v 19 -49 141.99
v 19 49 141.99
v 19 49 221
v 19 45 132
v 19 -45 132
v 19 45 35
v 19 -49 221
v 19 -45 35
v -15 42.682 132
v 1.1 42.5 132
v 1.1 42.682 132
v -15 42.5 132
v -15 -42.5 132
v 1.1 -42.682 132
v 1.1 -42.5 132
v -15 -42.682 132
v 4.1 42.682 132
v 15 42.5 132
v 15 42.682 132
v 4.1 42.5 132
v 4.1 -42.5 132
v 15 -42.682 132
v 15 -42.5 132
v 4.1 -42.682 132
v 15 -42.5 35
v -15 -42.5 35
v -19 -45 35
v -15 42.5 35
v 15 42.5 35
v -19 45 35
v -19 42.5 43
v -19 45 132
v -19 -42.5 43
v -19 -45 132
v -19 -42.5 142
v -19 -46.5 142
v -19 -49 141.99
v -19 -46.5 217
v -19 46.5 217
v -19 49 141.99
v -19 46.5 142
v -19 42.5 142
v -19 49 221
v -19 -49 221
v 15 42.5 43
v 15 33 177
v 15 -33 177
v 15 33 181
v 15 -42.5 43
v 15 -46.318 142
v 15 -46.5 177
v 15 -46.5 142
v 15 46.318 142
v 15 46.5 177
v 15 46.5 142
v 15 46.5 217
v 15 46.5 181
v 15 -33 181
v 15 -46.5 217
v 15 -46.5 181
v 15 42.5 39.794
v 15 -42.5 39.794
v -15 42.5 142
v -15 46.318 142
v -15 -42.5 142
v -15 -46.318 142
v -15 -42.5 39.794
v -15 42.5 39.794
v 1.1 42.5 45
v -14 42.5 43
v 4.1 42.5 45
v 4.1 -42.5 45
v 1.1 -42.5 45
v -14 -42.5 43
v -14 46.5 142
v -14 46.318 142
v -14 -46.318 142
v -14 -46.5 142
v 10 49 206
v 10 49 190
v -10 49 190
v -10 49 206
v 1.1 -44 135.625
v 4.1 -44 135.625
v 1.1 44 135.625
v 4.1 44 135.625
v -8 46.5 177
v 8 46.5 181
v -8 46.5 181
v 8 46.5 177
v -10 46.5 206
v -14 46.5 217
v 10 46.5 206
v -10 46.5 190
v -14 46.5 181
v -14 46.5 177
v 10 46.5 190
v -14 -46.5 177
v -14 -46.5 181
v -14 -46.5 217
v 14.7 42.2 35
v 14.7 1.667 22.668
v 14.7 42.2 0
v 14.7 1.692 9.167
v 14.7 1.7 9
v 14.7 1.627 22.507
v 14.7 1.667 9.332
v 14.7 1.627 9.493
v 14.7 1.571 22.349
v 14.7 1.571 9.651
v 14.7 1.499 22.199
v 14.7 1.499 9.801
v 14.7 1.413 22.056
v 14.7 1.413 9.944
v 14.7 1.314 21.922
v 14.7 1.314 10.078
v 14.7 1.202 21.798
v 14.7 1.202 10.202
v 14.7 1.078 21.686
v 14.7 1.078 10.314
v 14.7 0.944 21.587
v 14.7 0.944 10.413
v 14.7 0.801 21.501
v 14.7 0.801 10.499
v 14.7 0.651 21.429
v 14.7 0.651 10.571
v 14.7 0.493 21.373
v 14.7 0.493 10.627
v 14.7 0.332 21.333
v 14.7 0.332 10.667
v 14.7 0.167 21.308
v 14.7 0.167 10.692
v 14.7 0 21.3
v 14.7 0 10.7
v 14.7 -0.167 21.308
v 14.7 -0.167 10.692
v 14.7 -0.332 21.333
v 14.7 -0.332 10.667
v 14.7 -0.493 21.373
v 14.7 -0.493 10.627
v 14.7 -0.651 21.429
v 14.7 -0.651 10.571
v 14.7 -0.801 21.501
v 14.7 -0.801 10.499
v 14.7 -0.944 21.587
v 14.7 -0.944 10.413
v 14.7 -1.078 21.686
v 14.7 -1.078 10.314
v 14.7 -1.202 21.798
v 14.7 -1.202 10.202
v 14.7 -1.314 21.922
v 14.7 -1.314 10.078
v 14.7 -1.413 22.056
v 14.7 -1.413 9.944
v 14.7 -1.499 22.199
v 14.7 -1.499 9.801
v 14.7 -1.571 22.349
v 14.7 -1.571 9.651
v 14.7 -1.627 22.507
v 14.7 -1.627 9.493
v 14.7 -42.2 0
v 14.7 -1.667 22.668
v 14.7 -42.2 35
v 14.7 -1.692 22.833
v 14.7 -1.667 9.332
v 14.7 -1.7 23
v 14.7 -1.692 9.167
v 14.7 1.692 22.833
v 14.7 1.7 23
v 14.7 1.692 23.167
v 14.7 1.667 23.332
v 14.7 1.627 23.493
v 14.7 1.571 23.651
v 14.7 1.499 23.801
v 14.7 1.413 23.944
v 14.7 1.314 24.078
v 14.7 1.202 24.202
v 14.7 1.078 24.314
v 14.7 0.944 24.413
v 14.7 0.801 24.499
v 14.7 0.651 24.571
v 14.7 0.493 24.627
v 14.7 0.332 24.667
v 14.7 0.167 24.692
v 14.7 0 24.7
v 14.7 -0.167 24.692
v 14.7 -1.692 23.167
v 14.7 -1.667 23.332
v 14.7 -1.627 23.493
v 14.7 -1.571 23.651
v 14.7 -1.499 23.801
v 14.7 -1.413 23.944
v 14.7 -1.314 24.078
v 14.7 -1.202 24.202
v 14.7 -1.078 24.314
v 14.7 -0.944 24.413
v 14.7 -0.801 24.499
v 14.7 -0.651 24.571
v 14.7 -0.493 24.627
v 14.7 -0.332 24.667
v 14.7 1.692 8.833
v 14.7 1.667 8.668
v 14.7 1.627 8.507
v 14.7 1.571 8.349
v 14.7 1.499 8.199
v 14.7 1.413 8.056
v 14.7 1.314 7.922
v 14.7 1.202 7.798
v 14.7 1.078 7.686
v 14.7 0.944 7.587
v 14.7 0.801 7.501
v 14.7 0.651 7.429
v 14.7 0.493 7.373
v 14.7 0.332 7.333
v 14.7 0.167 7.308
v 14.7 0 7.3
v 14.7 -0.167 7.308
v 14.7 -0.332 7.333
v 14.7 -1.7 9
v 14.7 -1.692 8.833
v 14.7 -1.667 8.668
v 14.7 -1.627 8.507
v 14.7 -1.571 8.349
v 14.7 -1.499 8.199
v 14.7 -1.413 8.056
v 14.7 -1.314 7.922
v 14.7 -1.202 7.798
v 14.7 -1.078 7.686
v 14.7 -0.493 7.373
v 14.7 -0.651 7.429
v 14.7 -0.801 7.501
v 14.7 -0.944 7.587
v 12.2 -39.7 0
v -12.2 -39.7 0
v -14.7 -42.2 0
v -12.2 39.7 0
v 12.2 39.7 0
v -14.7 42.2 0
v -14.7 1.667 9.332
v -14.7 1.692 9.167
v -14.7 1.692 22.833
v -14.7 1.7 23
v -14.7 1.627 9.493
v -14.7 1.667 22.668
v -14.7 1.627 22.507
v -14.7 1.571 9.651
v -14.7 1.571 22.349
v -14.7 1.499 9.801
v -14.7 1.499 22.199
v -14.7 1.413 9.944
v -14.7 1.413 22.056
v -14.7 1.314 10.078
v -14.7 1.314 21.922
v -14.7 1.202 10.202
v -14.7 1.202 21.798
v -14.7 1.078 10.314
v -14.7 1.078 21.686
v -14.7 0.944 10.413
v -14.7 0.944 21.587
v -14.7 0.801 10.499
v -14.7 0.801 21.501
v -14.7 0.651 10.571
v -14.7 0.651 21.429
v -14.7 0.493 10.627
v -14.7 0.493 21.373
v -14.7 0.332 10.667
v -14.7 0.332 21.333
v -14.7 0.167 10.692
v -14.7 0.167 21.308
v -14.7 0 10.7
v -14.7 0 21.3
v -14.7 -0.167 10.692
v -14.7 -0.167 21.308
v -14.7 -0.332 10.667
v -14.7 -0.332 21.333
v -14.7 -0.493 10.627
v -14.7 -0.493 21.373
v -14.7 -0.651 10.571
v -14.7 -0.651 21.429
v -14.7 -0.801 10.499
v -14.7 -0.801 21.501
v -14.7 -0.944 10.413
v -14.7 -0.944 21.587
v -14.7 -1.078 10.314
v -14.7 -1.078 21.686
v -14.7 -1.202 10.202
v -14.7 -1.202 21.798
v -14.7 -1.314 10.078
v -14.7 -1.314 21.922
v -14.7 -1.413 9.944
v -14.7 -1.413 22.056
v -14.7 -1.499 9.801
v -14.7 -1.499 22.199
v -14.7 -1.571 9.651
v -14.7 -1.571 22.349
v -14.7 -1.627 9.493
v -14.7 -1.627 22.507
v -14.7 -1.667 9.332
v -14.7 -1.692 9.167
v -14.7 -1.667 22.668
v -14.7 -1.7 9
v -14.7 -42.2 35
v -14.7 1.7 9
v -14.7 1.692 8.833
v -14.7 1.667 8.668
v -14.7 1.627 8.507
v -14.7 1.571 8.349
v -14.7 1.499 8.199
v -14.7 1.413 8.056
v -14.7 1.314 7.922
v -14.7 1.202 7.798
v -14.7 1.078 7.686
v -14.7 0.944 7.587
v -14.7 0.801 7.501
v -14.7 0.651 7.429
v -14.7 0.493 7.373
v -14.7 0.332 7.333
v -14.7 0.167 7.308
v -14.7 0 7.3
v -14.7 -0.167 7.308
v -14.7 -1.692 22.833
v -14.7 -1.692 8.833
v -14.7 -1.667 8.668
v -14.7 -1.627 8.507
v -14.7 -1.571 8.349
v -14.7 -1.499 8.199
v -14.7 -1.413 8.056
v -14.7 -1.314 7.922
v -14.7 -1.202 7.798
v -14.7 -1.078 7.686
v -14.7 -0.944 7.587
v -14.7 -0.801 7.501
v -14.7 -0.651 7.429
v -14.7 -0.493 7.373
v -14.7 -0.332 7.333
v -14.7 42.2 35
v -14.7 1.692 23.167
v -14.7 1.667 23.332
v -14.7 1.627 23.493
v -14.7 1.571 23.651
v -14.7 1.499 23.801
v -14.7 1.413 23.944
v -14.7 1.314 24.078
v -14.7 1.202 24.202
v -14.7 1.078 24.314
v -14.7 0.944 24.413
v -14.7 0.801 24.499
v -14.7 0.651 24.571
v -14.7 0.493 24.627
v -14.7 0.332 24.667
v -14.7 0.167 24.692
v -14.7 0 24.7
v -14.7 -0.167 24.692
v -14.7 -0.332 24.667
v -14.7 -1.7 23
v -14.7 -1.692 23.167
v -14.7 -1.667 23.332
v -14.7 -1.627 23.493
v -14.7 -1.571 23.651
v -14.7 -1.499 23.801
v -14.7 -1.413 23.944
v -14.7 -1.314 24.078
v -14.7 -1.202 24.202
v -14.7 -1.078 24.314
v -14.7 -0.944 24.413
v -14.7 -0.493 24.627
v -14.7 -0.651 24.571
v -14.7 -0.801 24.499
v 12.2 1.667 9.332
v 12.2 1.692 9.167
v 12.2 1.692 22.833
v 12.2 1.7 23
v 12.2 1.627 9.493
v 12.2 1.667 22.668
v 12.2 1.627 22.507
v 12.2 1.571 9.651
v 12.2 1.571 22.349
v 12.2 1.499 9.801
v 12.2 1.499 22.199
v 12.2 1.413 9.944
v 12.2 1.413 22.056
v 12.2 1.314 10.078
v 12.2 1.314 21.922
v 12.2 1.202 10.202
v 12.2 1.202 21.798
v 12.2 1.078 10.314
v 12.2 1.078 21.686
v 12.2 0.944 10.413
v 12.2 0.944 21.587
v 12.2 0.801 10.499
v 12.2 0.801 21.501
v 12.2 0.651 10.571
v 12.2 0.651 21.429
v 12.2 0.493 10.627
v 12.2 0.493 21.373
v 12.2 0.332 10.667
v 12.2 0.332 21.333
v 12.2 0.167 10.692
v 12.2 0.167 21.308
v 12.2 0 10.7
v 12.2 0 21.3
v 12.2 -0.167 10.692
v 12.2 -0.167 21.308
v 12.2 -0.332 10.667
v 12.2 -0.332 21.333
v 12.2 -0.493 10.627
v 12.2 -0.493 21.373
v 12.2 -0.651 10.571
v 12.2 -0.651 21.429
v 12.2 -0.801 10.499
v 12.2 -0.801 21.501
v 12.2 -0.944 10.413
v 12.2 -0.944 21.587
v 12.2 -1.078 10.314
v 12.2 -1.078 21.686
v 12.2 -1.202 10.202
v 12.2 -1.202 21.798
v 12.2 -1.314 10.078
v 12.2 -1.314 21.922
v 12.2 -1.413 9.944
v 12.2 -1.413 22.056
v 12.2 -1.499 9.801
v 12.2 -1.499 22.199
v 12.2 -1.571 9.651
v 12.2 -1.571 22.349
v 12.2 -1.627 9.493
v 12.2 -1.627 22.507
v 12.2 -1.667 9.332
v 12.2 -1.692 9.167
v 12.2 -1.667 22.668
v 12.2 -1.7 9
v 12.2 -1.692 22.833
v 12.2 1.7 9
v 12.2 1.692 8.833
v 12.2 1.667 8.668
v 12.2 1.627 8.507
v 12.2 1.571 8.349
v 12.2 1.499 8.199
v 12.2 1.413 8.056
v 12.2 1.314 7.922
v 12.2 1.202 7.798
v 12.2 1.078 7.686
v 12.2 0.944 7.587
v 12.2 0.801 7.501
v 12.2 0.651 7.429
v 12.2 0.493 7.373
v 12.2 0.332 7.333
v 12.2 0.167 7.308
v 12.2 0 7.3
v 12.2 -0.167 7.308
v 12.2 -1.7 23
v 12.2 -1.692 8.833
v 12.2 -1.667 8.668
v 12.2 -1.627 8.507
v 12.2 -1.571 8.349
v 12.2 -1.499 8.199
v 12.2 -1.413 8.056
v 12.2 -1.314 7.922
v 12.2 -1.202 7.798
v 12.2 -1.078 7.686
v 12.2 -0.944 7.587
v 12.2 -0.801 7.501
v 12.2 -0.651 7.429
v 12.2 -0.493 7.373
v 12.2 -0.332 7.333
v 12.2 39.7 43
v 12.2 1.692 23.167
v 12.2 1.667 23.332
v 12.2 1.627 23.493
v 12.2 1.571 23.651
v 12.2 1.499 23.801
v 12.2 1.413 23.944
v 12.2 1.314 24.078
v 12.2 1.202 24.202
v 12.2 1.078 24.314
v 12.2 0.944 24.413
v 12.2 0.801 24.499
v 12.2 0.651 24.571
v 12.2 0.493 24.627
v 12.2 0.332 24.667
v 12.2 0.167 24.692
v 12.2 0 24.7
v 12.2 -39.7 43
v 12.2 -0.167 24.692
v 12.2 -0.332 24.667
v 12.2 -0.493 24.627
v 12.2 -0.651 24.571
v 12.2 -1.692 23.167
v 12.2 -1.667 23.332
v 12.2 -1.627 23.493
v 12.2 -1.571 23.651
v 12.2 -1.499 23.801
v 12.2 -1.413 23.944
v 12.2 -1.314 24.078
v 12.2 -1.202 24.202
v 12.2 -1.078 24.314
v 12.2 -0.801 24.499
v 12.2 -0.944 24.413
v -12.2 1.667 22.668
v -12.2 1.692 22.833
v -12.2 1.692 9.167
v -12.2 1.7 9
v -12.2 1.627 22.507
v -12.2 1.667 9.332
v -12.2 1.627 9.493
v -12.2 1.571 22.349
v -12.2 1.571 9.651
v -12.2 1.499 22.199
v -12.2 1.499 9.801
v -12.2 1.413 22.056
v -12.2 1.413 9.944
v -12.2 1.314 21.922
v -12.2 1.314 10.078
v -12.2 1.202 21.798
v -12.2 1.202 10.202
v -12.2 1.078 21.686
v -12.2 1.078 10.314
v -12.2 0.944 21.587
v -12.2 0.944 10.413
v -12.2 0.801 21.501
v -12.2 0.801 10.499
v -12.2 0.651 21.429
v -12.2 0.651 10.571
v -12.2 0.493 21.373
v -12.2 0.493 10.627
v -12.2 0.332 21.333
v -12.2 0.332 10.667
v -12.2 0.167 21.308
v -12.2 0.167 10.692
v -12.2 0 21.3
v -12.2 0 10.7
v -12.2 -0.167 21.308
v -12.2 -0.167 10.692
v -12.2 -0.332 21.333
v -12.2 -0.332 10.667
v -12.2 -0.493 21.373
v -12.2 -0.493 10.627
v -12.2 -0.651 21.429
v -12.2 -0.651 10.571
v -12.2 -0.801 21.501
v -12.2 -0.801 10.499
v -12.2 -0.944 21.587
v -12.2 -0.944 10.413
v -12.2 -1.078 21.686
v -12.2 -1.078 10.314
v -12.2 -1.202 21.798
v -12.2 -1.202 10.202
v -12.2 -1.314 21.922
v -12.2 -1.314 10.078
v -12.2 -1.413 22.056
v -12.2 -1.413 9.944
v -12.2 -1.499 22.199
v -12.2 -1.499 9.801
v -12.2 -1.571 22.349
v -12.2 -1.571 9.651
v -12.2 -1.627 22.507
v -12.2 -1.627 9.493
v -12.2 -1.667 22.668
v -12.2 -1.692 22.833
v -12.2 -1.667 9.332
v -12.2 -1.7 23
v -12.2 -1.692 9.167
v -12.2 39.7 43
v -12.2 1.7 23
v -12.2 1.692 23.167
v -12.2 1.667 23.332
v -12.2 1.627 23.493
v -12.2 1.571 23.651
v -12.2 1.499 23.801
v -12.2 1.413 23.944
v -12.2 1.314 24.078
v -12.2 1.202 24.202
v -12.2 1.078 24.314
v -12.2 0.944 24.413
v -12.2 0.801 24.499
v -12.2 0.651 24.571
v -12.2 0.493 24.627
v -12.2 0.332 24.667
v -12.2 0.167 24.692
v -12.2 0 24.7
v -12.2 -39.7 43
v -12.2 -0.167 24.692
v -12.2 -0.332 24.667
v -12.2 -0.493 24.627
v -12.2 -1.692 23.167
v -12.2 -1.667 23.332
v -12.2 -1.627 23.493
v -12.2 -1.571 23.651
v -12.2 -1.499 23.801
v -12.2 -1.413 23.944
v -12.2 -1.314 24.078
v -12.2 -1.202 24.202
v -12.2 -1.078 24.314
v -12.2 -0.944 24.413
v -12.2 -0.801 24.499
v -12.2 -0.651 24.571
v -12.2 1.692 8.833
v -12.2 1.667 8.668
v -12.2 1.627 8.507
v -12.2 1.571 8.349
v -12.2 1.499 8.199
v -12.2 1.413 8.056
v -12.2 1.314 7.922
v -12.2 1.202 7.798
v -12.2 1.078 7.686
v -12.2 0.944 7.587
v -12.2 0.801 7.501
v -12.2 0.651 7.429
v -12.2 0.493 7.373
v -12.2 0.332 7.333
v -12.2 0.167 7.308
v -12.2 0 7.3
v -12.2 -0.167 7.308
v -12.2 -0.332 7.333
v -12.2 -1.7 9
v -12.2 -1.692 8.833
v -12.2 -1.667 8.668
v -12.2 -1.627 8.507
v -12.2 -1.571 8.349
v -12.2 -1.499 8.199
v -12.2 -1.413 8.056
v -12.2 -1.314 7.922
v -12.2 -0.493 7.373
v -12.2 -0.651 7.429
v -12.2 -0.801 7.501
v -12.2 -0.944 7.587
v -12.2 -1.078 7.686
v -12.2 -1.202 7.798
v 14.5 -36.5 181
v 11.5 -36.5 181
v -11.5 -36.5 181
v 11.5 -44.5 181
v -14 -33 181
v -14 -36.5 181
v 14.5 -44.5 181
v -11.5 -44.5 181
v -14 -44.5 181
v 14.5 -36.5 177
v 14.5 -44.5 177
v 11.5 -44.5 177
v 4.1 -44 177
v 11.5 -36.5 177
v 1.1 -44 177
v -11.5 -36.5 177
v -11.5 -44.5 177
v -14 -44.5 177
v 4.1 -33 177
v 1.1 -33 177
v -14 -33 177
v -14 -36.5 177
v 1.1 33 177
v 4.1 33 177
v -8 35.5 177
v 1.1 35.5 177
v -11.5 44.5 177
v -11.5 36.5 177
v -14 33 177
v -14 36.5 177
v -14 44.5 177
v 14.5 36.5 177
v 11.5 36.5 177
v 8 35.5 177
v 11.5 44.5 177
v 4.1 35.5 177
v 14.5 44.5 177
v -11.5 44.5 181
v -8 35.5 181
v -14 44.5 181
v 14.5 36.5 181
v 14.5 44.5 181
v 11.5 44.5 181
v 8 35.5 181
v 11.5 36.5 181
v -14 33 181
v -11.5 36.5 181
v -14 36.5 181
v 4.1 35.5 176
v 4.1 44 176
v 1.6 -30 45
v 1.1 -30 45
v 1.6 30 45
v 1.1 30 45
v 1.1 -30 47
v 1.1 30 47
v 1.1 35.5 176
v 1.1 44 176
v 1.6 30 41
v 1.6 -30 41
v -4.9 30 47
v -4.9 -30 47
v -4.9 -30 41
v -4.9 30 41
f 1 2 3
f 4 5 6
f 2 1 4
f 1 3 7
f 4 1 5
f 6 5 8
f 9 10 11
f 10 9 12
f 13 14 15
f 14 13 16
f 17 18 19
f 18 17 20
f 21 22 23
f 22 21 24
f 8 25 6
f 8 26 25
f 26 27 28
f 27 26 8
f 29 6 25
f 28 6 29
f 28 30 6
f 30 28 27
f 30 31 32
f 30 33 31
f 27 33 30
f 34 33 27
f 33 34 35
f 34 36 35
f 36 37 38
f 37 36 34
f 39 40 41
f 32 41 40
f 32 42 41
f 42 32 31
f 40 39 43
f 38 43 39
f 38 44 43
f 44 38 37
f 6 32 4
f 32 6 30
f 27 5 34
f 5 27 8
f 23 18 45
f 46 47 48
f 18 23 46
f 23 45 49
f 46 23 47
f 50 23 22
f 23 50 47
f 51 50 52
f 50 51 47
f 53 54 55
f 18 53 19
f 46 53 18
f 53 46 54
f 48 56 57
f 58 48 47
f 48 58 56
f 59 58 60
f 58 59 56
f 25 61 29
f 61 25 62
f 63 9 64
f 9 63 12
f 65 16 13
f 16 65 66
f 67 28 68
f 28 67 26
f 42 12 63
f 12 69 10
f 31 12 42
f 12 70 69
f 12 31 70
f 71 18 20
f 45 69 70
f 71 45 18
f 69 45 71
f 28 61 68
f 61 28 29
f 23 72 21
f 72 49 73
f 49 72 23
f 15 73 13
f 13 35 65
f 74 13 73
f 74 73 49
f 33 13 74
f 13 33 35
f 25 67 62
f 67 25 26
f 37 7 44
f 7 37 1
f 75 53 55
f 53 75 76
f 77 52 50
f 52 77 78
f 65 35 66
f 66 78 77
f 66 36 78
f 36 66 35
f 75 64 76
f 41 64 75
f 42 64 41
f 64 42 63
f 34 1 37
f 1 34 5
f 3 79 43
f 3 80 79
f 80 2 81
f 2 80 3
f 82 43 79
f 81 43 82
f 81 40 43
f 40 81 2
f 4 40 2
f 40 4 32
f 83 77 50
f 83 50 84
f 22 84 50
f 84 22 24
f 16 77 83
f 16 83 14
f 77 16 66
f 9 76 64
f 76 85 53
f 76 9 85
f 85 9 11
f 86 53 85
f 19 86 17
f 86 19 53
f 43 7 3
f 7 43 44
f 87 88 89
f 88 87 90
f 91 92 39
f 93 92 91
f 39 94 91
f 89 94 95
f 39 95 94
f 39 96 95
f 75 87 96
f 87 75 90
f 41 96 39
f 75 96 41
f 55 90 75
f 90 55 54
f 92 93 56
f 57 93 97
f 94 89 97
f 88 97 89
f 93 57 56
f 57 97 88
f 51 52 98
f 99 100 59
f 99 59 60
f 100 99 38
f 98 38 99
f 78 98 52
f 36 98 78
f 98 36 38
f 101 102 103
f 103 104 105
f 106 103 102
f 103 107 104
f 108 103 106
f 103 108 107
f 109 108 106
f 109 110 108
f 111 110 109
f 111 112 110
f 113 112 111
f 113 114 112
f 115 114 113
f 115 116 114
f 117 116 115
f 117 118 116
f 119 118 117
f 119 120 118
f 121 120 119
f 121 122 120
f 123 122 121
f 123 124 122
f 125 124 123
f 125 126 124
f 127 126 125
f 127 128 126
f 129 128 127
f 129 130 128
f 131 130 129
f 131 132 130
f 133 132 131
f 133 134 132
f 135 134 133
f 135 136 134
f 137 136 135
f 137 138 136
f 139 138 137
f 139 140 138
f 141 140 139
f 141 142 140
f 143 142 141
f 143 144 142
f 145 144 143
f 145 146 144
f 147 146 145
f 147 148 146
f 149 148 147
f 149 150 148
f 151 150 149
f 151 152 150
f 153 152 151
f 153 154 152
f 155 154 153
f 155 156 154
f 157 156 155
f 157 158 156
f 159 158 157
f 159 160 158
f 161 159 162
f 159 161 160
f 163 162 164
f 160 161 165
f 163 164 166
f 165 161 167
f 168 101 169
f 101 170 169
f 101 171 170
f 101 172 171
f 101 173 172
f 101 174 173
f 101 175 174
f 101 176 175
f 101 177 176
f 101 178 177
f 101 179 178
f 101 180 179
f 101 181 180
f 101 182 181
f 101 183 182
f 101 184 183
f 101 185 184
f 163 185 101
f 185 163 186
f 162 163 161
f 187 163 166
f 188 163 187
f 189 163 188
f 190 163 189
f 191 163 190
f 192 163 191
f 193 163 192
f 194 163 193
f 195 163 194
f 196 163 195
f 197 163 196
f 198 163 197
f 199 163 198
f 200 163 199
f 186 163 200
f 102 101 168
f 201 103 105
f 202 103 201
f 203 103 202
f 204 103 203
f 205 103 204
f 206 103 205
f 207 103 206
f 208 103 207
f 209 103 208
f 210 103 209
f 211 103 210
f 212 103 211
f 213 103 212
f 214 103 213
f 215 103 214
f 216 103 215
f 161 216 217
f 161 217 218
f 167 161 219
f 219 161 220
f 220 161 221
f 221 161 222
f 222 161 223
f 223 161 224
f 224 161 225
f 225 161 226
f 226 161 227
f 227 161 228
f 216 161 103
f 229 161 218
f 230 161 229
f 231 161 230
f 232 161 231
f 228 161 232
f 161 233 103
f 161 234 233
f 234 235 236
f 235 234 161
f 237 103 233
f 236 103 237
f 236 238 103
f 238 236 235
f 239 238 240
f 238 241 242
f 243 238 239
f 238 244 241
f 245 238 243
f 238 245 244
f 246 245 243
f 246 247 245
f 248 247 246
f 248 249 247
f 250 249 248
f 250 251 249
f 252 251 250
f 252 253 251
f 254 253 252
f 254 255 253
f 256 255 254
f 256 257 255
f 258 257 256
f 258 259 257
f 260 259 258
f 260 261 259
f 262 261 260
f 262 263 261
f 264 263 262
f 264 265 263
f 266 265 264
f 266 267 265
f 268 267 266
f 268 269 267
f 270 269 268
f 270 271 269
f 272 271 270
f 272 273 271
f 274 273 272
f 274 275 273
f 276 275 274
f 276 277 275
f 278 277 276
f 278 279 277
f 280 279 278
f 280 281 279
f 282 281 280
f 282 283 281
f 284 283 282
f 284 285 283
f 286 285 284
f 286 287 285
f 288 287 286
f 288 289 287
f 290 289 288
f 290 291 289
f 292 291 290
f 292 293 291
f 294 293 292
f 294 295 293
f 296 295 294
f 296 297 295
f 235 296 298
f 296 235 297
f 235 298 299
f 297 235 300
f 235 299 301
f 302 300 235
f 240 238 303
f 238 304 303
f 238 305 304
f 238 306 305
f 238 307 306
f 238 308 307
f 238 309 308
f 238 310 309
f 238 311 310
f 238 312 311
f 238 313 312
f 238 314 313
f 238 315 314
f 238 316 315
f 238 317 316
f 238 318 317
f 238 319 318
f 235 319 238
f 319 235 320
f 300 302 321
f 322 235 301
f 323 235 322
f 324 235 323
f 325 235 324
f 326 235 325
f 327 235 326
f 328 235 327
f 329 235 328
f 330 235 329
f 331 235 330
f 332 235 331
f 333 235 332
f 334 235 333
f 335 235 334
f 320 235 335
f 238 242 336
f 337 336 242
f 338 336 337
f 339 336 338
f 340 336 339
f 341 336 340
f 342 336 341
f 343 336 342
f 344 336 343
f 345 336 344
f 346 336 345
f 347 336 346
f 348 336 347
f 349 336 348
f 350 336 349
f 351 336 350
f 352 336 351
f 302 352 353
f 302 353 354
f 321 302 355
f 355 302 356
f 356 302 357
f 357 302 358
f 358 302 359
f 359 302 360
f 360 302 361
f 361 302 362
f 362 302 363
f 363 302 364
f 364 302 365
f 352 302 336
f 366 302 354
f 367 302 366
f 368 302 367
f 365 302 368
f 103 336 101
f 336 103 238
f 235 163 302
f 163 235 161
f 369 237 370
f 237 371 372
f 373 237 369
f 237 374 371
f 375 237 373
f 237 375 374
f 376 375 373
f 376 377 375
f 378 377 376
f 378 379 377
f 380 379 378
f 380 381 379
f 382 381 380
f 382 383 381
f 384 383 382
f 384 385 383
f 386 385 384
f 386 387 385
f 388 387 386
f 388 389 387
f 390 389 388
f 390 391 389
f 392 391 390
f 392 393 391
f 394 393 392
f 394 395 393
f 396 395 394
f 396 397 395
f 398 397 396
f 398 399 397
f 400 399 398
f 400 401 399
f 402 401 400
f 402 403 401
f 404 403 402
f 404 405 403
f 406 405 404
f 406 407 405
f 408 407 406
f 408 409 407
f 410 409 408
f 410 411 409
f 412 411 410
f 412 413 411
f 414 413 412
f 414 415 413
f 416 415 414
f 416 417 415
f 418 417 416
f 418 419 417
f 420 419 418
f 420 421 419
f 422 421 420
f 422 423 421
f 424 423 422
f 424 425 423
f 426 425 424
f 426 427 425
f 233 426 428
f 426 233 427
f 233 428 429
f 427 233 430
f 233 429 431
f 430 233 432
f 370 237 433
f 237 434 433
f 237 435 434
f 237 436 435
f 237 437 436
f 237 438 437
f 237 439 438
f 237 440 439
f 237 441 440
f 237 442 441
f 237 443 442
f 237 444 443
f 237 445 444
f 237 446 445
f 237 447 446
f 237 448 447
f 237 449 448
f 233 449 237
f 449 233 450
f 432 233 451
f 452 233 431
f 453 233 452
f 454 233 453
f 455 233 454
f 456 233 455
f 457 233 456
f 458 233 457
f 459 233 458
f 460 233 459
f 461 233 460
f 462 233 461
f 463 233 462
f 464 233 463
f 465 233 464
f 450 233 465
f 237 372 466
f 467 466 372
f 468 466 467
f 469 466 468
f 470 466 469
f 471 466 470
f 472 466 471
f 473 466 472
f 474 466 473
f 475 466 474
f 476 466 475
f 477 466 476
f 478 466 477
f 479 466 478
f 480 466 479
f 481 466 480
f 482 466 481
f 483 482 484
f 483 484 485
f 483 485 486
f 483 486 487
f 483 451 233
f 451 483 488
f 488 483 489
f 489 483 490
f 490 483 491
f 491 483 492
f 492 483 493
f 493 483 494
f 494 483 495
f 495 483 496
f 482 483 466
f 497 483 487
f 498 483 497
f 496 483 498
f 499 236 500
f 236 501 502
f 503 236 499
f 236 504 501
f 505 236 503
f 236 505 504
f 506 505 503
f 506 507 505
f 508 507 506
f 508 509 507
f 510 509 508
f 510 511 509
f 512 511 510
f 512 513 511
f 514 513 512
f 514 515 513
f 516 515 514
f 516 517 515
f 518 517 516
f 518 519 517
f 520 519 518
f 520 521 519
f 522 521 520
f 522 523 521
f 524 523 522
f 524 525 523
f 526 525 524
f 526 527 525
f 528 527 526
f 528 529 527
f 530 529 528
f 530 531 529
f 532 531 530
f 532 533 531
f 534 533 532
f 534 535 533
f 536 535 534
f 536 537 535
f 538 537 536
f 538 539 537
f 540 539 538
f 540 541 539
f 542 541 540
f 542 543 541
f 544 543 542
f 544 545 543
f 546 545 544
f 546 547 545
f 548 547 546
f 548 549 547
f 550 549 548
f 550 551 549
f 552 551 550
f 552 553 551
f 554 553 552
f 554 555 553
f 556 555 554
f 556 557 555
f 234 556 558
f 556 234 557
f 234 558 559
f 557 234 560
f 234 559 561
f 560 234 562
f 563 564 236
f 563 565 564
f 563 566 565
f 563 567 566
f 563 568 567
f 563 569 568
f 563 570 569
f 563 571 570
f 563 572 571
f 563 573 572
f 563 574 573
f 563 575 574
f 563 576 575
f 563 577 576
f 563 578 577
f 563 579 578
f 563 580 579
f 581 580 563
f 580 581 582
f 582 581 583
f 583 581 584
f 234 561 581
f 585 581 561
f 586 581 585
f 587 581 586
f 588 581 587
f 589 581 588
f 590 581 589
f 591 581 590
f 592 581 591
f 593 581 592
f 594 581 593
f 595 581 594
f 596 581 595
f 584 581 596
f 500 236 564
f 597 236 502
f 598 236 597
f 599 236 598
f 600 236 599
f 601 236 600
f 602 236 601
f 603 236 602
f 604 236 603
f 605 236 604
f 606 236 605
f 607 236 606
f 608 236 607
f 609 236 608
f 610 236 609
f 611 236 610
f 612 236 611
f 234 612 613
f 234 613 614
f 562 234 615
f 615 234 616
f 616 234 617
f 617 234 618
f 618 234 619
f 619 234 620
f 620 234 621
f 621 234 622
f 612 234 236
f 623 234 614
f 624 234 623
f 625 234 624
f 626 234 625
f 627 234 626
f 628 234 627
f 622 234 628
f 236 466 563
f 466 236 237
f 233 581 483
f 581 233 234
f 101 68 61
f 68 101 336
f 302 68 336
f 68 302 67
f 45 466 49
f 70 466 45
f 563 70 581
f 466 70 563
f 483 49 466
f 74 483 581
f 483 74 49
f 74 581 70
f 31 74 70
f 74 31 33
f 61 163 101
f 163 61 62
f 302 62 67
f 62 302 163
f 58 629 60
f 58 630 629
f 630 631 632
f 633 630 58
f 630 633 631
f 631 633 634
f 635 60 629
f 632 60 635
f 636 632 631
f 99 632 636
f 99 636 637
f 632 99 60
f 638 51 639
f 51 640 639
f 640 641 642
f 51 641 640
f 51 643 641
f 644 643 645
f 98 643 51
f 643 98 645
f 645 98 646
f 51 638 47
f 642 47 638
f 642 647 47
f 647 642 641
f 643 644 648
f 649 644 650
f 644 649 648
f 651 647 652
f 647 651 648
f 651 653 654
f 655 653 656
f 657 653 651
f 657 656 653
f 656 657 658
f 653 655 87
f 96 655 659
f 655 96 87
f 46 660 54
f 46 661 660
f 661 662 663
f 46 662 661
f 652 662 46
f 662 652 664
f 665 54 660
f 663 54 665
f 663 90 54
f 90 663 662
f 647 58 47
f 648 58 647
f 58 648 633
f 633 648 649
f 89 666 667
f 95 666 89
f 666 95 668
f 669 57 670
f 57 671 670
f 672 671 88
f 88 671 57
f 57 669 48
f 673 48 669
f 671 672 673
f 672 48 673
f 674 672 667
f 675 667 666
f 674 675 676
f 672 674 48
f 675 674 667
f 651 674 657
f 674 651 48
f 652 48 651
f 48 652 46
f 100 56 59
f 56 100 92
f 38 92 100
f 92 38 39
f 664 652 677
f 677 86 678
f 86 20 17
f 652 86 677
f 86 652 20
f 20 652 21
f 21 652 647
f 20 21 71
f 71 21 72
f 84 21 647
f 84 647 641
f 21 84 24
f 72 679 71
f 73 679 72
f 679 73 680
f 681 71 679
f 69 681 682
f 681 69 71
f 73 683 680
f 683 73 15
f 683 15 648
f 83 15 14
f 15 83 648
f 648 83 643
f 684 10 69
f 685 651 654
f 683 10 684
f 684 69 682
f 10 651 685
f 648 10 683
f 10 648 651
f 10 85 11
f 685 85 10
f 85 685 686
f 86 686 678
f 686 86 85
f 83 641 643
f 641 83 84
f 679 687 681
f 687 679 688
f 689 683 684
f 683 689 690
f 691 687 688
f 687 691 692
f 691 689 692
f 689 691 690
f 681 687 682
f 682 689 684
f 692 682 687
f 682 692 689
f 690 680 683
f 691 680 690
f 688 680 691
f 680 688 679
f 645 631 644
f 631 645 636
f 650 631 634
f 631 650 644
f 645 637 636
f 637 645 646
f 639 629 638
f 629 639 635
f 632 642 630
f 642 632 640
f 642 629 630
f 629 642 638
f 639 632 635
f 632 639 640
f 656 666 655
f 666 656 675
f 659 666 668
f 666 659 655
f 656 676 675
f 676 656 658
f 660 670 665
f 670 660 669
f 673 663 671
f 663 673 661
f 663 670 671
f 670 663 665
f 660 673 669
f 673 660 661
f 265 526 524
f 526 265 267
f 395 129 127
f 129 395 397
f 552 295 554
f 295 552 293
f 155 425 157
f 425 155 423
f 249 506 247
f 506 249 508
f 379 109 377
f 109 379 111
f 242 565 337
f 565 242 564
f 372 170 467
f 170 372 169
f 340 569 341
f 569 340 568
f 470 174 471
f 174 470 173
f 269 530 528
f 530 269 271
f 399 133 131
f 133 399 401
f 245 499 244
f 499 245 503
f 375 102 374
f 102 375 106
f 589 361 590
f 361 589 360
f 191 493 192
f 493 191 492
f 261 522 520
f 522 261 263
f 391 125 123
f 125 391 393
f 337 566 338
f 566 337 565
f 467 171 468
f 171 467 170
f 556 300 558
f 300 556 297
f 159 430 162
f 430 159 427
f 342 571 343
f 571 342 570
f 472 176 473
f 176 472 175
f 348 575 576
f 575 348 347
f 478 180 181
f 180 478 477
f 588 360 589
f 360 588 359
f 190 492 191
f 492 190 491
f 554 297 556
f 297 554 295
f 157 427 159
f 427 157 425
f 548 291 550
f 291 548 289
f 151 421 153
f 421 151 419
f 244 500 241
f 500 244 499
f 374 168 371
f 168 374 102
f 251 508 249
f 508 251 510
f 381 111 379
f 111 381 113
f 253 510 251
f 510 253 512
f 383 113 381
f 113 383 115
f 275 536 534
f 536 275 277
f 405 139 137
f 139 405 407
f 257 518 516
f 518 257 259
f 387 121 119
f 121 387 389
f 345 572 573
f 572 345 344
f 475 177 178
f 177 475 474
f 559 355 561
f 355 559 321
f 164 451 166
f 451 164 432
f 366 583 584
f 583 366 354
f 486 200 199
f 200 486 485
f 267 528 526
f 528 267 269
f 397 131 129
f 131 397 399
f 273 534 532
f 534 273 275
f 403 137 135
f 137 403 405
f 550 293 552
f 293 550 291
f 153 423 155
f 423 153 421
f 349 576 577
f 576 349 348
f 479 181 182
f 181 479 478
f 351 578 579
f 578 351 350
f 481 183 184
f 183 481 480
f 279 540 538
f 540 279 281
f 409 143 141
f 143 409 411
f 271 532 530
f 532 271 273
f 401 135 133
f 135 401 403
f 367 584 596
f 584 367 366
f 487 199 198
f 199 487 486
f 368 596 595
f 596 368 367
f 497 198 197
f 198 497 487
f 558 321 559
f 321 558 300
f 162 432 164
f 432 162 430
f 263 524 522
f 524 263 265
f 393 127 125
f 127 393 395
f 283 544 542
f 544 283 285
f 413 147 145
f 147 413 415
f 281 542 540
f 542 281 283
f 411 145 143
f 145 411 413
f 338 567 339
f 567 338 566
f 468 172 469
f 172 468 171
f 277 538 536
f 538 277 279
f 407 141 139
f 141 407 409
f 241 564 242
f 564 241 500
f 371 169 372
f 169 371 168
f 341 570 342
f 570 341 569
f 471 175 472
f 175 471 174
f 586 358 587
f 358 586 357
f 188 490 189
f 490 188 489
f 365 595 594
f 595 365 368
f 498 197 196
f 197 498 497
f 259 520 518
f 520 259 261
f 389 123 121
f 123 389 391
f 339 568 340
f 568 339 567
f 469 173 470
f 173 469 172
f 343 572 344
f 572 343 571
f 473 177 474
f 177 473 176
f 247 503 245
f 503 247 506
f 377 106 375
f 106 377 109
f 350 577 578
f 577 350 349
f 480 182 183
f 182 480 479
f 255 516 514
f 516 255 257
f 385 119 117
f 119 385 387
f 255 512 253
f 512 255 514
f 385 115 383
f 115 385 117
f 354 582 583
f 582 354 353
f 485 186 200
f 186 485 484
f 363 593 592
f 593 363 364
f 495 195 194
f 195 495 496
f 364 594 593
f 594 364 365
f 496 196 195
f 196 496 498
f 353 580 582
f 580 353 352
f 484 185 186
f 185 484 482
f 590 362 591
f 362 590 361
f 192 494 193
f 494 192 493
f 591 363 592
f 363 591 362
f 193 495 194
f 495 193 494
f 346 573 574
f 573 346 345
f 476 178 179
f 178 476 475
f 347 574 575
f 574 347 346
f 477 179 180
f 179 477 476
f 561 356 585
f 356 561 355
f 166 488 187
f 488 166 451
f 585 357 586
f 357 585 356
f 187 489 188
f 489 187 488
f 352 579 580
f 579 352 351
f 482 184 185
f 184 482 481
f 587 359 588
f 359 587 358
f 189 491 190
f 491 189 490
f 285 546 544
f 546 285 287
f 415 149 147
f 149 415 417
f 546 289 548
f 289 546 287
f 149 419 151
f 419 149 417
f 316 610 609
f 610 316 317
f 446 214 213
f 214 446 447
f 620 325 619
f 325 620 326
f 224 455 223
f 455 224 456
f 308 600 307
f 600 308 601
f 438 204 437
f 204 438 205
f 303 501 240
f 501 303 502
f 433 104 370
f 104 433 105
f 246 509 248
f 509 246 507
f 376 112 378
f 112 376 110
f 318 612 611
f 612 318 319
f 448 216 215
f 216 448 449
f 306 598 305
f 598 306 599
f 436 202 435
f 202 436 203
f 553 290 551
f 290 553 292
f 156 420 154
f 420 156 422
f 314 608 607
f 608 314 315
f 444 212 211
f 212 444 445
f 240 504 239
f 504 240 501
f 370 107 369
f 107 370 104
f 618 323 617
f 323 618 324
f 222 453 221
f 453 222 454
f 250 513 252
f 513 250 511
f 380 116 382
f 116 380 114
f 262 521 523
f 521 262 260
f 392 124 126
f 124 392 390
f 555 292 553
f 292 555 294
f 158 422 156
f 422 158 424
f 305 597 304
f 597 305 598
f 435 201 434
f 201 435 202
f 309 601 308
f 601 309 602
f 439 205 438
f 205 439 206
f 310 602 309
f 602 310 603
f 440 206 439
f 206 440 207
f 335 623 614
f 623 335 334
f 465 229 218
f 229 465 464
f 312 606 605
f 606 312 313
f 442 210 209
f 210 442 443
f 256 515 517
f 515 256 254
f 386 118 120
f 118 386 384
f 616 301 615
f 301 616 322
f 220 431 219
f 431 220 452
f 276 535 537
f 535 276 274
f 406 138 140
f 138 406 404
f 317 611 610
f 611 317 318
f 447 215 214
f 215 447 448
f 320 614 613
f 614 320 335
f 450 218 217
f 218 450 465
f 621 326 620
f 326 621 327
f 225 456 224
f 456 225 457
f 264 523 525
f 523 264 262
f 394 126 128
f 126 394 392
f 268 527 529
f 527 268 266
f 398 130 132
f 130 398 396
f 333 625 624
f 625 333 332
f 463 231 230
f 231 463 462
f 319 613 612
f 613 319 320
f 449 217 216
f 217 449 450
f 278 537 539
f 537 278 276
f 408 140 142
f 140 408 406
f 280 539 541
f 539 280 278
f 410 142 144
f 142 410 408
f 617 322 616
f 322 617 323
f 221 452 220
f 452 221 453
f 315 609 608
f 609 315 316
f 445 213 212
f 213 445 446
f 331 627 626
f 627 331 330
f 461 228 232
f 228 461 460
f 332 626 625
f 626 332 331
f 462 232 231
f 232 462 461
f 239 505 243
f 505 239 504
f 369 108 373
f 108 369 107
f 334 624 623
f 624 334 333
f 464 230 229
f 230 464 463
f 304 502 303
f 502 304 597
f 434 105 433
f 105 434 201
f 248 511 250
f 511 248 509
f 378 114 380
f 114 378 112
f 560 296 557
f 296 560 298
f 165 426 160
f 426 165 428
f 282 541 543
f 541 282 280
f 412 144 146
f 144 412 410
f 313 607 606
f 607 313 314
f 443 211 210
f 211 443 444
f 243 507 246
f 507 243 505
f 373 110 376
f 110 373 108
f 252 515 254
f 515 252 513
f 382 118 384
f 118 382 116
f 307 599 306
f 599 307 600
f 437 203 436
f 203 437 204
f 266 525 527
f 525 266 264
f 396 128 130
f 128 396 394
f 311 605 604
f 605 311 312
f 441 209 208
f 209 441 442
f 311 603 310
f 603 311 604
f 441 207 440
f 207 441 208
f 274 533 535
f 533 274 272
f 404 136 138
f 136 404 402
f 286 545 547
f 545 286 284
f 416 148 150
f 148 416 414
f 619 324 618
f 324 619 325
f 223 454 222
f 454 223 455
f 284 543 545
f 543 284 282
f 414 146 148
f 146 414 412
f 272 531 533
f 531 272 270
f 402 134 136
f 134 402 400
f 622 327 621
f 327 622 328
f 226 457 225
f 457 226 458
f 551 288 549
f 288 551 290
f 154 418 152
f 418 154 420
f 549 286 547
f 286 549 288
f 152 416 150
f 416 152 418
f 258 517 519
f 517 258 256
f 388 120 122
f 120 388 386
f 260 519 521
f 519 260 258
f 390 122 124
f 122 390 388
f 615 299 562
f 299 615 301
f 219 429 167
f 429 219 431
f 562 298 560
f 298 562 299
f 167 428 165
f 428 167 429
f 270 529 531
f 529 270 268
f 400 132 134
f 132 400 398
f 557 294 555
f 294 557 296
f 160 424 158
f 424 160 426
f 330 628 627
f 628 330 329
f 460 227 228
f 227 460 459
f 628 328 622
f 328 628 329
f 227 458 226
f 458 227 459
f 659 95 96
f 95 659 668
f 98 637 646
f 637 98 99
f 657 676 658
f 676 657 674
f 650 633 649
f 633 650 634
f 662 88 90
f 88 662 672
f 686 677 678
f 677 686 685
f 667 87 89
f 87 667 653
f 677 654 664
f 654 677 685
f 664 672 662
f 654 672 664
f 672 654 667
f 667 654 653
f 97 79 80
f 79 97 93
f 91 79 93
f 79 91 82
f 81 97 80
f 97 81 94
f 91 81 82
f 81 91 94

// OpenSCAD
// Standalone robot upper body B piece = v4 equipment bay
// (splice tongues / central OpenCR bulkhead / battery shelf / door opening).
// Edit shared dimensions in frame_v4.scad so the assembly and this part stay linked.
// Print UPRIGHT as placed, tongues down (~190 tall); the battery shelf
// bridges ~30 mm - allow bridging or a little support via the door opening.

part_mode = "upper_body_b";
part_cutaway = false;     // true removes a corner quarter: bulkhead, OpenCR
                          // bosses, guide grooves and battery shelf visible.
                          // Set back to false before exporting the STL!
print_export = true;      // use high quality $fn for STL export

include <frame_master.scad>
